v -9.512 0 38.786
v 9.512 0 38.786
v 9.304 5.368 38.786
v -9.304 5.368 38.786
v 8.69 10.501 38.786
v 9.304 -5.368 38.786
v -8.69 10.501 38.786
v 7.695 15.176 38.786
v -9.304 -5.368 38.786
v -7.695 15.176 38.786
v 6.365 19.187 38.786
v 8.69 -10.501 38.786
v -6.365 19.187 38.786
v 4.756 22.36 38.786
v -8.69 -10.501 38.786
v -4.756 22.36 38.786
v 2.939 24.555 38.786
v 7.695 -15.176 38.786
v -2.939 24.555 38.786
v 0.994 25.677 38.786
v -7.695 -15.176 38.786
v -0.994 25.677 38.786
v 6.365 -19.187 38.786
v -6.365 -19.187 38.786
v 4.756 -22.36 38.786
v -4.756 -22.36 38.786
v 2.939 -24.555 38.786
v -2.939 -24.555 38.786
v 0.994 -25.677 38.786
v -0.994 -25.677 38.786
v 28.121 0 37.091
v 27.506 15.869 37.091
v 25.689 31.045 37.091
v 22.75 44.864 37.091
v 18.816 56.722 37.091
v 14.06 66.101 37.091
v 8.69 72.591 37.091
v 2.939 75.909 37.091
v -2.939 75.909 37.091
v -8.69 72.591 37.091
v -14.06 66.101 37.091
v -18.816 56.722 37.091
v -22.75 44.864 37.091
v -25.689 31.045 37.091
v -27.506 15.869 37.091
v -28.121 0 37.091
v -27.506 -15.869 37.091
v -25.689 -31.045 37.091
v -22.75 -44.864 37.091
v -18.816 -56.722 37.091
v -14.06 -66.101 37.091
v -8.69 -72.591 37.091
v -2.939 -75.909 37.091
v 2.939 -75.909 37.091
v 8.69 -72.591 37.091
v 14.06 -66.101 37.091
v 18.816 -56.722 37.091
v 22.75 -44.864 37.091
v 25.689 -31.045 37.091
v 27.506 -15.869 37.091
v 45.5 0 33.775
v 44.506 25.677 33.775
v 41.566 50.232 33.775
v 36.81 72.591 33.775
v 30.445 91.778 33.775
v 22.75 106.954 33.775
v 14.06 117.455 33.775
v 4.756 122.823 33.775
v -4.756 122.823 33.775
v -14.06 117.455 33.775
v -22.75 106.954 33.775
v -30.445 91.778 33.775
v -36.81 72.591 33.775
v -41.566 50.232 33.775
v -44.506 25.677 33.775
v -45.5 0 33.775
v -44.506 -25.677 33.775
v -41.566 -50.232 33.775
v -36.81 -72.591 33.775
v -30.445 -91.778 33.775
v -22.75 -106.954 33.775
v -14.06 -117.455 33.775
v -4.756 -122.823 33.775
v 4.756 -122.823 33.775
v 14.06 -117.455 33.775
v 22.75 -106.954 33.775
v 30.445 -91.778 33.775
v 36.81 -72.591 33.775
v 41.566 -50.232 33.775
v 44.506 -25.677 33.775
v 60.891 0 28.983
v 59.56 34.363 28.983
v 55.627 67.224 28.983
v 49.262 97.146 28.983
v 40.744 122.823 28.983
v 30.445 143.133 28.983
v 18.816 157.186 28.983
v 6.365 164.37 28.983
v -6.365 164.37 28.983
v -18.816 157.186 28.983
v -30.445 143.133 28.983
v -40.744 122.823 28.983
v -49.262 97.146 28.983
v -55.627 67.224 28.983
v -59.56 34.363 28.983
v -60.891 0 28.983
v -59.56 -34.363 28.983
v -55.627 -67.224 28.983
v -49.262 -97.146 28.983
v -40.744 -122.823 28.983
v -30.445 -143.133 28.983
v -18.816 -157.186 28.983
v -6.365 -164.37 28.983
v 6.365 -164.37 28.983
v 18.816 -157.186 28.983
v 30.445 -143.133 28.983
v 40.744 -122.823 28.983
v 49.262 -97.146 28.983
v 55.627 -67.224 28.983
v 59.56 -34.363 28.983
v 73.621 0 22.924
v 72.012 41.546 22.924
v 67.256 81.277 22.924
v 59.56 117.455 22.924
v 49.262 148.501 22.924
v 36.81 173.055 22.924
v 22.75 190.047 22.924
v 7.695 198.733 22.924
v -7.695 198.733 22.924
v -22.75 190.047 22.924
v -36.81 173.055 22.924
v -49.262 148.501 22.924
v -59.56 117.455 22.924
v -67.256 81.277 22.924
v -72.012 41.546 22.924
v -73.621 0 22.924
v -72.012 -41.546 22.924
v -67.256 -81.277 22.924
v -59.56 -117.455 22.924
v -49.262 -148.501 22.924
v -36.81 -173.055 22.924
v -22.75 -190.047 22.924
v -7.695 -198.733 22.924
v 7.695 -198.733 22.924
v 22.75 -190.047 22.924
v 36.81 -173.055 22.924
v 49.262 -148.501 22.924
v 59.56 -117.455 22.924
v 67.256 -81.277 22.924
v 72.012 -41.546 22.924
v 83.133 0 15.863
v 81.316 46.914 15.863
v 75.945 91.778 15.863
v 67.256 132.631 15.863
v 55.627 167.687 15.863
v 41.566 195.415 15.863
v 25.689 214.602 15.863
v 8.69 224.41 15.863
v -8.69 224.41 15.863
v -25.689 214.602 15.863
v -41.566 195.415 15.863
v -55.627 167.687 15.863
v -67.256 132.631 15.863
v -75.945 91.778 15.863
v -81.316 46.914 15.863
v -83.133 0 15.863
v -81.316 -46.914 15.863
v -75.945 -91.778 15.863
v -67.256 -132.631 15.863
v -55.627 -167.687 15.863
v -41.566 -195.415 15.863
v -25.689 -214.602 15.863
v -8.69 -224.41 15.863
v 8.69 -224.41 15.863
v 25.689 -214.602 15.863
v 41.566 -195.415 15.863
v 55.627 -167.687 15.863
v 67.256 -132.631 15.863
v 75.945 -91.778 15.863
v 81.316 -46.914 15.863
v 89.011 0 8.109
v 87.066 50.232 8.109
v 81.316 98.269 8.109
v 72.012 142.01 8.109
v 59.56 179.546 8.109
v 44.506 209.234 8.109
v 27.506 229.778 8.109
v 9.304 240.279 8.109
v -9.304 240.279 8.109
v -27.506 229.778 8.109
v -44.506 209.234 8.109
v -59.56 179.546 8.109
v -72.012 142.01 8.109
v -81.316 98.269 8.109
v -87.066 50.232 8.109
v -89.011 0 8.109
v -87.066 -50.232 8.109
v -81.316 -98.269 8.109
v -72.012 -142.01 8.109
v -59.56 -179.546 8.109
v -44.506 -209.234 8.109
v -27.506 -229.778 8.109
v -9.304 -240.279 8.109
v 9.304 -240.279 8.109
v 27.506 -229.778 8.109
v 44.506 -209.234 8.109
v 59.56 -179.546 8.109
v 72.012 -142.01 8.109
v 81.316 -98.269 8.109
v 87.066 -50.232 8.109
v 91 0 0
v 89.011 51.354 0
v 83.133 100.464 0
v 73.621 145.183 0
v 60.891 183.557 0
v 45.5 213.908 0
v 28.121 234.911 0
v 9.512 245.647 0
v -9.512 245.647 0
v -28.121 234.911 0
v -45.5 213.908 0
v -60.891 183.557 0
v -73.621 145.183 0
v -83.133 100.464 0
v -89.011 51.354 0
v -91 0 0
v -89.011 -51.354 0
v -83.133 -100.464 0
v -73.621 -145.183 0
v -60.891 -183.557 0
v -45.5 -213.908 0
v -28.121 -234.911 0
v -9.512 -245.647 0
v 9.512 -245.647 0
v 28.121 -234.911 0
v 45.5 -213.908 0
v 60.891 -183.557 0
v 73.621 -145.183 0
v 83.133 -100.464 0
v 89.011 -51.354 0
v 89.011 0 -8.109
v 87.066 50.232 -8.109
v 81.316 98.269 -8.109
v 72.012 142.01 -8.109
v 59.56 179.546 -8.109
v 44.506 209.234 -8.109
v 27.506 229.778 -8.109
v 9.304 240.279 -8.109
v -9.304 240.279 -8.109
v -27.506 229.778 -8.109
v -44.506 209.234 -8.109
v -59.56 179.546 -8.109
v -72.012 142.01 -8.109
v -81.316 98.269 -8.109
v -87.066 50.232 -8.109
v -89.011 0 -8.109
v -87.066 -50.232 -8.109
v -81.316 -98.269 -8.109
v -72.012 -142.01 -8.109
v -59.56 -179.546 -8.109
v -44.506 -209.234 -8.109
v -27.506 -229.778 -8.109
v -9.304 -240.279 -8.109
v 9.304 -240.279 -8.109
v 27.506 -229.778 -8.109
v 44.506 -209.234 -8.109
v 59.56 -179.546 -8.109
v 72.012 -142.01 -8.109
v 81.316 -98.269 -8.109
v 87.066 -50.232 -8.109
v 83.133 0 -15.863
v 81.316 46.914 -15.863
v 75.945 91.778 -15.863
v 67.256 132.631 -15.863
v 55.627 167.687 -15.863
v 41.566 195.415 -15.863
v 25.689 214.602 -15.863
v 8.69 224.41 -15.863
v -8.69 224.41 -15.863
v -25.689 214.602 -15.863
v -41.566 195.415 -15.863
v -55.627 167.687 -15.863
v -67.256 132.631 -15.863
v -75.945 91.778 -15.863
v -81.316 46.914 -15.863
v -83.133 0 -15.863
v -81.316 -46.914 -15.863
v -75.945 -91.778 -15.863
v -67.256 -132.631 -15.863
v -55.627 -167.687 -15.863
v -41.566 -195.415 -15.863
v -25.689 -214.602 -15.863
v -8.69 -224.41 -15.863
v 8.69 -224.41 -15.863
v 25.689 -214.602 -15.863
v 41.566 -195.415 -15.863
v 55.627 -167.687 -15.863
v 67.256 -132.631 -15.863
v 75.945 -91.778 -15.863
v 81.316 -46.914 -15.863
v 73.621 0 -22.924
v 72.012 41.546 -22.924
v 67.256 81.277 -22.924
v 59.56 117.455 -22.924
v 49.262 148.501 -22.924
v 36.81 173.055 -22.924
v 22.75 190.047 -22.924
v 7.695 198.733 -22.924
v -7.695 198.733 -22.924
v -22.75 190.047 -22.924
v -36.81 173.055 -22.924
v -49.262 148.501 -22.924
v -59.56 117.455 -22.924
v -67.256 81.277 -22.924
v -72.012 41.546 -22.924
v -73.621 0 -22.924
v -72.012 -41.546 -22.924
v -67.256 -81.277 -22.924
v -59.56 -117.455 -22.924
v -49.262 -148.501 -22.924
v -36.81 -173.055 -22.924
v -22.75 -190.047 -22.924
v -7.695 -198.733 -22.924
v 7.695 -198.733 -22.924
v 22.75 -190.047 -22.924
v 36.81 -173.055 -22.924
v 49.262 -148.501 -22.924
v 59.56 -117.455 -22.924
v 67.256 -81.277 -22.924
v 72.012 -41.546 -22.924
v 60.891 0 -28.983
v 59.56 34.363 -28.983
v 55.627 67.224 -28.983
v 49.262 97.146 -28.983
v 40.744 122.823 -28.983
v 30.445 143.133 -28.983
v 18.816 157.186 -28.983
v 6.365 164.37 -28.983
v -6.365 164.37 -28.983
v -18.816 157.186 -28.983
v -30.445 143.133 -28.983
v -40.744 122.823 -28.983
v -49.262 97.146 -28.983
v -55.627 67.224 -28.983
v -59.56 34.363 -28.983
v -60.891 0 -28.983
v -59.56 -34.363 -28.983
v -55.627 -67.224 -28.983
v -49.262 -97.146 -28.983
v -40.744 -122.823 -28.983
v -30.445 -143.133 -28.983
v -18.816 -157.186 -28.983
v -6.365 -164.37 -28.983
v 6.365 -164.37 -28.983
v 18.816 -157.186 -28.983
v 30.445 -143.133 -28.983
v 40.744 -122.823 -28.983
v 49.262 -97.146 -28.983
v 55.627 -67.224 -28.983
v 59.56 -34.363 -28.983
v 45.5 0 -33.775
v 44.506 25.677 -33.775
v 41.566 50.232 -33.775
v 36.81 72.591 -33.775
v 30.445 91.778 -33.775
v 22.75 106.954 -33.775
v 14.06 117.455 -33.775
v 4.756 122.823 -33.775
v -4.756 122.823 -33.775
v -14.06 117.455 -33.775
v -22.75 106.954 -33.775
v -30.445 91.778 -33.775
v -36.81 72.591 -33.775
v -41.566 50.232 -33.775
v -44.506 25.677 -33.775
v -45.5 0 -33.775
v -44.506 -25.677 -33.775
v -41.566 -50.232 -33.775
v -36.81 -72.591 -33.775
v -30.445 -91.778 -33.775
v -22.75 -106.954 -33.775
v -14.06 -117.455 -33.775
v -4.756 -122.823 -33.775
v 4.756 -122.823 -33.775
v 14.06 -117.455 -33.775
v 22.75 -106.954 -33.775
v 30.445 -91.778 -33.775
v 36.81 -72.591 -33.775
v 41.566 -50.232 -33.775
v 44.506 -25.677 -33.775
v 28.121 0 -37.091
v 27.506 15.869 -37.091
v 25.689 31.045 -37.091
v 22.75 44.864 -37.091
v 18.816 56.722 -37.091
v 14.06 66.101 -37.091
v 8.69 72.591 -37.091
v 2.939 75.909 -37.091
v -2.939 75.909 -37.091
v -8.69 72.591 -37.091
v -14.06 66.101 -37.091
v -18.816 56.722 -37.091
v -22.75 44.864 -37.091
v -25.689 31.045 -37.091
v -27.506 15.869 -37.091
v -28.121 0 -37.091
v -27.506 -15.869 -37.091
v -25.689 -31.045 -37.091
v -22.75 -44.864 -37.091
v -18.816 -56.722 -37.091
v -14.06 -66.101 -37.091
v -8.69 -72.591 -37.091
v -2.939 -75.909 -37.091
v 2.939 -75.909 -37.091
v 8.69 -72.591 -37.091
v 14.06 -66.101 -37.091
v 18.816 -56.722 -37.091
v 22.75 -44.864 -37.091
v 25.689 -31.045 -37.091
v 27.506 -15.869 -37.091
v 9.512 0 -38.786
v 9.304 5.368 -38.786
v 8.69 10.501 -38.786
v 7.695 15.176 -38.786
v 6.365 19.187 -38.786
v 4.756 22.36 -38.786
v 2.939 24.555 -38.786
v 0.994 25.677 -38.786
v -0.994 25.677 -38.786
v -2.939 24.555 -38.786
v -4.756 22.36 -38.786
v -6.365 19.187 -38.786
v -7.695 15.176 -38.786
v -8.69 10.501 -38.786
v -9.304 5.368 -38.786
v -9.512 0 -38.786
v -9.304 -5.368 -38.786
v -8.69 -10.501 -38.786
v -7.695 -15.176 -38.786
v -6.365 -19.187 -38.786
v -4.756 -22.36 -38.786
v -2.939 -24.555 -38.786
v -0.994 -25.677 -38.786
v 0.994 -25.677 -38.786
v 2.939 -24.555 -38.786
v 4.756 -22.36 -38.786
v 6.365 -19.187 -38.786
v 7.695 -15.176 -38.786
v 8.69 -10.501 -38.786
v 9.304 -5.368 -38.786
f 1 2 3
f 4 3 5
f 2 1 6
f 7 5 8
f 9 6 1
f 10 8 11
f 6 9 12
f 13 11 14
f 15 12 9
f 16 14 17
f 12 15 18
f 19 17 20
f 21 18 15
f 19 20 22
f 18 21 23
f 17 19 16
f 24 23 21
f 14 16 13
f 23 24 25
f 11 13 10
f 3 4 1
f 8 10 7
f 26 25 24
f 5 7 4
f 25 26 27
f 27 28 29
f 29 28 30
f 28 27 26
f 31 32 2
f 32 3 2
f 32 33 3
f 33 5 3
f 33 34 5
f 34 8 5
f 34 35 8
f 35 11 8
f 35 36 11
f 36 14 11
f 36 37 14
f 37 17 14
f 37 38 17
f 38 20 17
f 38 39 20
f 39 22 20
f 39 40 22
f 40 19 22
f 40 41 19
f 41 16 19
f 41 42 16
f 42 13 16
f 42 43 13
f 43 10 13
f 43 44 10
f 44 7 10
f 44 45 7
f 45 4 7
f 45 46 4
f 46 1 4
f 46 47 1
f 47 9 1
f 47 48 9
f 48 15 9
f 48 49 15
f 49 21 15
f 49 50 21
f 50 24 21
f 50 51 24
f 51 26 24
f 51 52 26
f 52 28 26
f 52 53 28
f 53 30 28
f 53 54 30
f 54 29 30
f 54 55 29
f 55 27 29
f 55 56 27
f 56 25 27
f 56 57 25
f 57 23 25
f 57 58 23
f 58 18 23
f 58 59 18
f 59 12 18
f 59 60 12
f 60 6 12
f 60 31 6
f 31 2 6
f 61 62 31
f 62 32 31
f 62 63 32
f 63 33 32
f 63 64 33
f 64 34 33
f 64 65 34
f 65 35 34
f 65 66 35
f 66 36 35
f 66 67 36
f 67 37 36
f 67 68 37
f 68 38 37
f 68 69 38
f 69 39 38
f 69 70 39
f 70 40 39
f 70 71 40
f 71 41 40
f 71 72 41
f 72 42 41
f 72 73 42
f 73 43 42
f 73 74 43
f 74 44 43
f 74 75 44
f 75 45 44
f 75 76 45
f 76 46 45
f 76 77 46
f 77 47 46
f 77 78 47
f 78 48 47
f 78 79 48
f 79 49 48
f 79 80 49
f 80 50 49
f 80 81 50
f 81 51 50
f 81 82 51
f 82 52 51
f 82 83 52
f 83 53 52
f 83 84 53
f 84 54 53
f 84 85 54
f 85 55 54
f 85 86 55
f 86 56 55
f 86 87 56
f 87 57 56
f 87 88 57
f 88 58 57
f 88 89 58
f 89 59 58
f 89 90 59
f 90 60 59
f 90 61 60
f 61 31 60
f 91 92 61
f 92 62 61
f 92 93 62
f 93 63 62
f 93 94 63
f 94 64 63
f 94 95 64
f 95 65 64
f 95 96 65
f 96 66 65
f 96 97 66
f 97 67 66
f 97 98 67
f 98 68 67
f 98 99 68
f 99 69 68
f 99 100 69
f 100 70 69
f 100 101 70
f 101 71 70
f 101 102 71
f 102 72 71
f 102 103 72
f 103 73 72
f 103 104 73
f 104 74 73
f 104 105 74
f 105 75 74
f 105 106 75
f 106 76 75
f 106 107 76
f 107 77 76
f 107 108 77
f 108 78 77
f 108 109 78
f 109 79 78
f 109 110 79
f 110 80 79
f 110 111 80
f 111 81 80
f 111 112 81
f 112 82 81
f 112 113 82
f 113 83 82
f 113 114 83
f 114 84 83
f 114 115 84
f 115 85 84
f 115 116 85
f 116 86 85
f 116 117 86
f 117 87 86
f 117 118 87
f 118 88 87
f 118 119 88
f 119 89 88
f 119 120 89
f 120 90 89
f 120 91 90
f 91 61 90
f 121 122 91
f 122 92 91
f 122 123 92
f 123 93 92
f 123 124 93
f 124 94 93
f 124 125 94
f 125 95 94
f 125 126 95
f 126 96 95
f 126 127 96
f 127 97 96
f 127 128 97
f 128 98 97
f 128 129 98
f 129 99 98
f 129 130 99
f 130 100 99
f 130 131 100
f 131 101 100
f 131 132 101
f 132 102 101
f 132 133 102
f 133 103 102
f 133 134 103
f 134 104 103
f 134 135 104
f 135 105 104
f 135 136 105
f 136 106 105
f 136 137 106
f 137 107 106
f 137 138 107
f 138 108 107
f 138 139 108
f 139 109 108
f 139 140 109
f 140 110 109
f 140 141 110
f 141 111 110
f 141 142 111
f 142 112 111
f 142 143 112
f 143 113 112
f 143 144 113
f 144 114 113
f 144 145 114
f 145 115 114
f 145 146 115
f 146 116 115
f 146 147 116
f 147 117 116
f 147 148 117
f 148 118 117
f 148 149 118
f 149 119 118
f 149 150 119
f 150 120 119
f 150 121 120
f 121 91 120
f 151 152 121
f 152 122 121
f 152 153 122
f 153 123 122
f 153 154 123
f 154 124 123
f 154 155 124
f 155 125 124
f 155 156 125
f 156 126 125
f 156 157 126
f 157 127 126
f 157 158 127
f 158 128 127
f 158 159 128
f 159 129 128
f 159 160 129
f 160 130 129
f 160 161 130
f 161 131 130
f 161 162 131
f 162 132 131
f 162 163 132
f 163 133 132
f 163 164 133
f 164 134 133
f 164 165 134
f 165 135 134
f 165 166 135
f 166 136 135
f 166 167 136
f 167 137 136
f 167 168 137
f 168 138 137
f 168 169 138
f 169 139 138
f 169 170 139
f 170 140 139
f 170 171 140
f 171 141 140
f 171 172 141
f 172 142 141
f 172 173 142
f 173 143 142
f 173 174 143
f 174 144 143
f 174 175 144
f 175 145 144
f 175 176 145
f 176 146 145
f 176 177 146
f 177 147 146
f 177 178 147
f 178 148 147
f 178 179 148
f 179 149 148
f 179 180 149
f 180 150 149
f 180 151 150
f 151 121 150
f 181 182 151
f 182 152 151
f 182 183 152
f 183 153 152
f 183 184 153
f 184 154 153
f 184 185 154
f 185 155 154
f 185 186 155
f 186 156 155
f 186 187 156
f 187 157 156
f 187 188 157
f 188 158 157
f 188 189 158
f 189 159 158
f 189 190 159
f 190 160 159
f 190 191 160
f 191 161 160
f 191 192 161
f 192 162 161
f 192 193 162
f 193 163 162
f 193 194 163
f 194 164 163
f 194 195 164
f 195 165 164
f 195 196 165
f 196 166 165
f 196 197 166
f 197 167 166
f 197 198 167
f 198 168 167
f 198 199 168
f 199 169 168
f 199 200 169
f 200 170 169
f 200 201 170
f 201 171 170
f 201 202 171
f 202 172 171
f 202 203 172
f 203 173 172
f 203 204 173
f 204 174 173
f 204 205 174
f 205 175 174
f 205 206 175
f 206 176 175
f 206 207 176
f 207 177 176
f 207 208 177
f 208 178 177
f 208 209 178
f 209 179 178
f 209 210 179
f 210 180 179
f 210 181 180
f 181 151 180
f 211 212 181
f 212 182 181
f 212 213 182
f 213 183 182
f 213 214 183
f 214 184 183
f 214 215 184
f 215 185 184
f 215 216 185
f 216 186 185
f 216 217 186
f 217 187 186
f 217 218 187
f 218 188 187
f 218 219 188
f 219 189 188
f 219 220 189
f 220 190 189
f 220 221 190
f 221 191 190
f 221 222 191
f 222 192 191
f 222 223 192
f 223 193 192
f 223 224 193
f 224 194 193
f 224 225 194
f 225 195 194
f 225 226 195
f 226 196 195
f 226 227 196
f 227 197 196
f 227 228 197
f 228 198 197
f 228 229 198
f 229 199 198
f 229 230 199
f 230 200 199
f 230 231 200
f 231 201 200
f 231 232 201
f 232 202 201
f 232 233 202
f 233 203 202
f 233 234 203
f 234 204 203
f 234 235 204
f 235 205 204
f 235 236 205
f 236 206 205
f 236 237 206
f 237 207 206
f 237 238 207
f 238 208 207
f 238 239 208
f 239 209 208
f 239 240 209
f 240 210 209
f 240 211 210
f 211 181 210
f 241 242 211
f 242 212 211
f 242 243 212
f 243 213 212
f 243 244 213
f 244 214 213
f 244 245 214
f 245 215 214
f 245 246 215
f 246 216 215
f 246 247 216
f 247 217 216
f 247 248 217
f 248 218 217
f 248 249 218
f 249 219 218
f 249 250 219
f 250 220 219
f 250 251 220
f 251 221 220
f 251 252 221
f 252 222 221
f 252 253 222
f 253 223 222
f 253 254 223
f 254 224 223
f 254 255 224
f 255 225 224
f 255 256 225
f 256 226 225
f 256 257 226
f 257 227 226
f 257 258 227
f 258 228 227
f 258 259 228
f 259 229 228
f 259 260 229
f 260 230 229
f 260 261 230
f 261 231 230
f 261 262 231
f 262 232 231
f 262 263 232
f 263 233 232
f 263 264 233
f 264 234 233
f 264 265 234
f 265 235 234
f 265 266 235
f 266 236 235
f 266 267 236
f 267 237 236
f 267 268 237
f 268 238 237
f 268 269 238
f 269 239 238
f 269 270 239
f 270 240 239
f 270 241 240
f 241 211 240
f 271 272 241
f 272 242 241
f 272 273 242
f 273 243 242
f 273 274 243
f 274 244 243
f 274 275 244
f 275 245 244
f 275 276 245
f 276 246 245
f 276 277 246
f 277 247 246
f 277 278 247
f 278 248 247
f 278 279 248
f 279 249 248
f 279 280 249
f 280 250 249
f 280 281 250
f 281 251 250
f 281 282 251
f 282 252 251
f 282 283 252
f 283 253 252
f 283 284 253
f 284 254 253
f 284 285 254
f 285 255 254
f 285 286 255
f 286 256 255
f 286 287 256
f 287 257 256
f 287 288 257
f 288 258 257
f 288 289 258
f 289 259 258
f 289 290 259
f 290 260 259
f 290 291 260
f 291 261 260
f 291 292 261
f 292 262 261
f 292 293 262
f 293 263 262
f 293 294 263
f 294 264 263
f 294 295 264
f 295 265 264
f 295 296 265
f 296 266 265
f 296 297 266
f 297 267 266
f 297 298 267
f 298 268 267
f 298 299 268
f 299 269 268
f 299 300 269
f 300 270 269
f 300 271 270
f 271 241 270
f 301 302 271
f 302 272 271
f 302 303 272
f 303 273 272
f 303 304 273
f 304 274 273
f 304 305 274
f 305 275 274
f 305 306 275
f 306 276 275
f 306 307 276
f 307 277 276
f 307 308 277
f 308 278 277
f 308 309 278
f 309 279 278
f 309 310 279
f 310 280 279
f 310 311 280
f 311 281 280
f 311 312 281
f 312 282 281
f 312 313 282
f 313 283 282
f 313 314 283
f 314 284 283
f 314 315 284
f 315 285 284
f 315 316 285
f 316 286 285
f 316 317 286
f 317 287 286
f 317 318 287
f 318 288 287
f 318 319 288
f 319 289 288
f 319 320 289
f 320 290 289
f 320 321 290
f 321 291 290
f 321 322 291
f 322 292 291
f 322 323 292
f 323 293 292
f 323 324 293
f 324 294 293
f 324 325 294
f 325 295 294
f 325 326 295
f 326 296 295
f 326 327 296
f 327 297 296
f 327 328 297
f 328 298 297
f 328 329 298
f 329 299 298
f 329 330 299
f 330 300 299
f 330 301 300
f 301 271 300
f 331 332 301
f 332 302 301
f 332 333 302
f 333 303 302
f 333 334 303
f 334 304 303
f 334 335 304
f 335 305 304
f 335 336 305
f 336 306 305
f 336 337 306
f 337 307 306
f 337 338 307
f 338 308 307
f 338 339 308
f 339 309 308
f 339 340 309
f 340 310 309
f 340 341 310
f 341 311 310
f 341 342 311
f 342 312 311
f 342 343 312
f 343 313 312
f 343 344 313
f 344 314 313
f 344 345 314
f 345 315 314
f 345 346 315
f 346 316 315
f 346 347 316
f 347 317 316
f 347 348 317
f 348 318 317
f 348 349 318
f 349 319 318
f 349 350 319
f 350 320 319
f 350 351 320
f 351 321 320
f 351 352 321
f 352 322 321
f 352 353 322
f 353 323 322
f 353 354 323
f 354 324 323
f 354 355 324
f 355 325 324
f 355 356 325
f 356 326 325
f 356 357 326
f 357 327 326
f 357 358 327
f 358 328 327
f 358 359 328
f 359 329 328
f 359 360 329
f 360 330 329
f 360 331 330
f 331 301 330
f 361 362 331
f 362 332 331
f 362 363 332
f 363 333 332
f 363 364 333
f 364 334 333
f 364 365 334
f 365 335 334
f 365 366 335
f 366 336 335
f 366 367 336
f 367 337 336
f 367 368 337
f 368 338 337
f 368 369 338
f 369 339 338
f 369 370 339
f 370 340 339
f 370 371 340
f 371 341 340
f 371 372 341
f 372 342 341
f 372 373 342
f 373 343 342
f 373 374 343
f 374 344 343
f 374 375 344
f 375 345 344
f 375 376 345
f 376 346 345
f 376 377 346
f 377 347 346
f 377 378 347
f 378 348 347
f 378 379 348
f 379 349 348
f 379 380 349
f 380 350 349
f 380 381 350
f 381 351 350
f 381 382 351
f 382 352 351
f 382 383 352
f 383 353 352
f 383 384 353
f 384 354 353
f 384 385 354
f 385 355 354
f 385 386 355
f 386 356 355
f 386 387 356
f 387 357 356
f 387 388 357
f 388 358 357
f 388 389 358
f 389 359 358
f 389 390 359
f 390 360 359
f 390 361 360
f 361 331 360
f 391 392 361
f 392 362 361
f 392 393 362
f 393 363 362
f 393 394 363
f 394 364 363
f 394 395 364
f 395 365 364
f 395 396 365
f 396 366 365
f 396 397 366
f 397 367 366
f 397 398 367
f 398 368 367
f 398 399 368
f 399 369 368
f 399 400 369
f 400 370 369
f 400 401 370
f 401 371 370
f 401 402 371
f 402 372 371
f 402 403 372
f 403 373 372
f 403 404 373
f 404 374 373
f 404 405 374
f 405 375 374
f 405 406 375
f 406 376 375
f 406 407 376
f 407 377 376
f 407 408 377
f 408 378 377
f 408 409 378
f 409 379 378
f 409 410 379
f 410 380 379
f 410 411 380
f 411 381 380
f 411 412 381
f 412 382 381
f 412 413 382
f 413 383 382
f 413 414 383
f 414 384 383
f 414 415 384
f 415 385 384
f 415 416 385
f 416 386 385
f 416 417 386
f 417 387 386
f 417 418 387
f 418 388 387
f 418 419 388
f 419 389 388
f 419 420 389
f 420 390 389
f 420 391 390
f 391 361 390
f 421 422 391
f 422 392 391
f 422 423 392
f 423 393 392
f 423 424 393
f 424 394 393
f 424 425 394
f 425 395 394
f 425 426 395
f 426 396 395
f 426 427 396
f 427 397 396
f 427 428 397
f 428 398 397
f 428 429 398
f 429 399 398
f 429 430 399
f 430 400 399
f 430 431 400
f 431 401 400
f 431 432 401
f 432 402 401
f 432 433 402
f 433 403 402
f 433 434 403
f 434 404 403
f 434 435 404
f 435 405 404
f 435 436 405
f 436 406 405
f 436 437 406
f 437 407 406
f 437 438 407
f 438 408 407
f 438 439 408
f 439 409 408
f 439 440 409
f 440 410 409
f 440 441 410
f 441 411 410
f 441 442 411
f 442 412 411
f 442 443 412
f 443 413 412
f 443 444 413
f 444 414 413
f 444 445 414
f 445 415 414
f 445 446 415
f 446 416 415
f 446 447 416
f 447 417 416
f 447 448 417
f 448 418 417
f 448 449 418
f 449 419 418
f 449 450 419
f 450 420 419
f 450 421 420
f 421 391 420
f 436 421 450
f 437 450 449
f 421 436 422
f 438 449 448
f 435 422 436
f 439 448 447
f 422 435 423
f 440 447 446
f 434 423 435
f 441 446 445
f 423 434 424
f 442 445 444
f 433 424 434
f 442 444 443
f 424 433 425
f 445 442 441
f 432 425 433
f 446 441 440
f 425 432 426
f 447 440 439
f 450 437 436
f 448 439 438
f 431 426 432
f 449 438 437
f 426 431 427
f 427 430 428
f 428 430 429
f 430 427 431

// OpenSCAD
// Generated by SolidPython 1.0.1 on 2020-07-29 00:46:48


scale(v = [7, 19, 3]) {
	sphere(r = 13);
}
/***********************************************
*********      SolidPython code:      **********
************************************************
 
# import packages: SolidPython
from solid import *
from solid.utils import *
from itertools import chain, combinations, permutations


class Resize:

    def __init__(self, scad_file):
        self.scad_file = scad_file
        #self.scad_file = import_scad(scad_file)
        # cone/cylinder param:
        self.r1 = 0
        self.r2 = 0
        self.h = 0
        # rectangular prism param:
        self.w = 0
        self.l = 0
        # ellipse param:
        self.r = 0

    # import OpenScad code (file name corresponds to shape)


    # classify shape + parameters
    def assign(self, param1, param2, param3):
        if self.scad_file == 'cone.scad':
            self.r1 = param1
            self.r2 = param2
            self.h = param3
        elif self.scad_file == 'cylinder.scad':
            self.r1 = param1
            self.r2 = param2
            self.h = param3
        elif self.scad_file == 'rectangularPrism.scad':
            self.h = param1
            self.l = param2
            self.w = param3
        else:
            self.r = param1
            self.h = param2

    # resize parameters
    def iterate(self):
        x = range(3, 20, 2)
        i = 1
        if self.scad_file == 'cone.scad':
            tempList = list(permutations(x, 2))
            for temp in tempList:
                param1 = temp[0]
                param2 = temp[1]
                filepath = 'produced_scad_files/' + 'cone' + str(param1) + '_' + str(param2) + '_' + '.scad'
                scad_render_to_file(cylinder(h=param1, r1=param2, r2=0), filepath)

        elif self.scad_file == 'cylinder.scad':
            tempList = list(permutations(x, 3))
            for temp in tempList:
                param1 = temp[0]
                param2 = temp[1]
                filepath = 'produced_scad_files/' + 'cylinder' + str(param1) + '_' + str(param2) + '_' + '.scad'
                scad_render_to_file(cylinder(h=param1, r1=param2, r2=param2), filepath)

        elif self.scad_file == 'rectangularPrism.scad':
            tempList = list(permutations(x, 3))
            for temp in tempList:
                param1 = temp[0]
                param2 = temp[1]
                param3 = temp[2]
                filepath = 'produced_scad_files/' + 'rectangularPrism' + str(param1) + '_' + str(param2) + '_' + str(
                    param3) + '.scad'
                scad_render_to_file(cube(size=(param1, param2, param3)), filepath)

        elif self.scad_file == 'ellipse.scad':
            tempList = list(permutations(x, 4))
            for temp in tempList:
                param1 = temp[0]
                param2 = temp[1]
                param3 = temp[2]
                param4 = temp[3]
                filepath = 'produced_scad_files/' + 'ellipse' + str(param1) + '_' + str(param2) + '_' + str(param3) + '_' + str(param4) + '.scad'
                scad_render_to_file(scale([param1, param2, param3])(sphere(r=param4)), filepath)

    def render_to_scadfile(self):
        scad_render_to_file(scad, 'example.scad') 
 
************************************************/
